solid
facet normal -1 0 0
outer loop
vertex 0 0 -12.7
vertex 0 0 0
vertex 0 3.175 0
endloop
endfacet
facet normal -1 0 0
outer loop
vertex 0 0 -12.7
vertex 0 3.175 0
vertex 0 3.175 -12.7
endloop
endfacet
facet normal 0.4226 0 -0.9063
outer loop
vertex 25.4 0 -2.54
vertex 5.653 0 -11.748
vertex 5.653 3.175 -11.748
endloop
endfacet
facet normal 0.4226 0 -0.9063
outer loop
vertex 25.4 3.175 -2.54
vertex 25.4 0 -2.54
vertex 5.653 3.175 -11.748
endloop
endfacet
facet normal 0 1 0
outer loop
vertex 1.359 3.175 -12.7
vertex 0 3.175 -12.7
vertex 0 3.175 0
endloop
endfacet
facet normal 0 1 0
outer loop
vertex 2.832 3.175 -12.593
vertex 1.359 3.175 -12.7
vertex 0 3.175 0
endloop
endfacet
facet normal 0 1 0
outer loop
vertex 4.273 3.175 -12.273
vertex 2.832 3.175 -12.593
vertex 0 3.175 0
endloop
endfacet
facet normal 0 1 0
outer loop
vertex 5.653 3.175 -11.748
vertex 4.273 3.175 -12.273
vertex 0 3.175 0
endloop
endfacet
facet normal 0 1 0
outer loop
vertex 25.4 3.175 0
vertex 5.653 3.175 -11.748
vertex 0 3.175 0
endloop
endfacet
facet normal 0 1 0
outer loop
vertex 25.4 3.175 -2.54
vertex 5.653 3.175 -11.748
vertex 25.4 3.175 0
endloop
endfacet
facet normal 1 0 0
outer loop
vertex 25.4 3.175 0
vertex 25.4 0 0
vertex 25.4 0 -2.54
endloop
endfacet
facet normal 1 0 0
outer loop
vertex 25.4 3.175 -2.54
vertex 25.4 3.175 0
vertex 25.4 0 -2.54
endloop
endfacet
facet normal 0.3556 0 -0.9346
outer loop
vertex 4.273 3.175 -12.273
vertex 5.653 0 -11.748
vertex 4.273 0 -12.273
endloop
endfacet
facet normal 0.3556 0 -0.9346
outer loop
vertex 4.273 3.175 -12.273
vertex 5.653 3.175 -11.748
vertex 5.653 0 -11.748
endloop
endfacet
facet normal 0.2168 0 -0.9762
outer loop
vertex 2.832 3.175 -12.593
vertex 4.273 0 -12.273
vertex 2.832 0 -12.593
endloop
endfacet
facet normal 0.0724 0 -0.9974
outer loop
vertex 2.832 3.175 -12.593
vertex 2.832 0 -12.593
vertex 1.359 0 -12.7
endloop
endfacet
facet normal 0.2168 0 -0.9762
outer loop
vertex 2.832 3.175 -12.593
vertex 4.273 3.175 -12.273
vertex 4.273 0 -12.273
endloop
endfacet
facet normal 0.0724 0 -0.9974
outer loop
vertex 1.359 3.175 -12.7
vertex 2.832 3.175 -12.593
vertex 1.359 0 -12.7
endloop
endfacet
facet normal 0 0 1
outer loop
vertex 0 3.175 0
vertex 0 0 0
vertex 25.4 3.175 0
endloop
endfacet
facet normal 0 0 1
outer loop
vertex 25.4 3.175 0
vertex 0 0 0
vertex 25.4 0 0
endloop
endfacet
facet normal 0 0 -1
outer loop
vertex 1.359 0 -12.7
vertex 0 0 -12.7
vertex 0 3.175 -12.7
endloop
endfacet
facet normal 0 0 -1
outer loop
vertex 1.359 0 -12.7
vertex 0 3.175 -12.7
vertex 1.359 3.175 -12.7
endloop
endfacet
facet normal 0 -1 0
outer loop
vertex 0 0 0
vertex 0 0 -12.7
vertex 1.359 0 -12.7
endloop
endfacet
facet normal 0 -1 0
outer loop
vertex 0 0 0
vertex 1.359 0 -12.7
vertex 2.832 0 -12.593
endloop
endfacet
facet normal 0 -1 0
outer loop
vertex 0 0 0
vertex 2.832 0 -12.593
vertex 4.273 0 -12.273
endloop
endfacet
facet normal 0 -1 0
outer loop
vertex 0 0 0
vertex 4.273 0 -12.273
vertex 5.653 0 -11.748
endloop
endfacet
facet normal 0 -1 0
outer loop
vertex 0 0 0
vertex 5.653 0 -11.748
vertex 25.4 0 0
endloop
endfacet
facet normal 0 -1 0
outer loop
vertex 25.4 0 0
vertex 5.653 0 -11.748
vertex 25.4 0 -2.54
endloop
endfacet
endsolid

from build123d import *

# Parameters (mm, degrees)
SKETCH1_W           = 25.4
SKETCH1_H           = 12.7
BOSS_EXTRUDE1_DEPTH = 3.175
CHAMFER1_SIZE       = 10.16
CHAMFER1_SIZE2      = 21.788190312
FILLET1_R           = 10.16


with BuildPart() as part:
    # Sketch1 → Boss-Extrude1 (new body)
    with BuildSketch(Plane(origin=(0, 0, 0), x_dir=(1, 0, 0), z_dir=(0, 1, 0))):
        with Locations((12.7, 6.35)):
            Rectangle(SKETCH1_W, SKETCH1_H)
    extrude(amount=BOSS_EXTRUDE1_DEPTH)

    # Chamfer1
    chamfer1_edges = [part.edges().sort_by_distance(p)[0] for p in [
        (25.4, 1.5875, -12.7),
    ]]
    chamfer1_side = [part.faces().sort_by_distance(p)[0] for p in [
        (25.4, 1.5875, -6.35),
    ]]
    chamfer(chamfer1_edges, length=CHAMFER1_SIZE, length2=CHAMFER1_SIZE2, reference=chamfer1_side[0])

    # Fillet1
    fillet1_edges = [part.edges().sort_by_distance(p)[0] for p in [
        (3.611809688, 1.5875, -12.7),
    ]]
    fillet(fillet1_edges, radius=FILLET1_R)


solid = part.part
